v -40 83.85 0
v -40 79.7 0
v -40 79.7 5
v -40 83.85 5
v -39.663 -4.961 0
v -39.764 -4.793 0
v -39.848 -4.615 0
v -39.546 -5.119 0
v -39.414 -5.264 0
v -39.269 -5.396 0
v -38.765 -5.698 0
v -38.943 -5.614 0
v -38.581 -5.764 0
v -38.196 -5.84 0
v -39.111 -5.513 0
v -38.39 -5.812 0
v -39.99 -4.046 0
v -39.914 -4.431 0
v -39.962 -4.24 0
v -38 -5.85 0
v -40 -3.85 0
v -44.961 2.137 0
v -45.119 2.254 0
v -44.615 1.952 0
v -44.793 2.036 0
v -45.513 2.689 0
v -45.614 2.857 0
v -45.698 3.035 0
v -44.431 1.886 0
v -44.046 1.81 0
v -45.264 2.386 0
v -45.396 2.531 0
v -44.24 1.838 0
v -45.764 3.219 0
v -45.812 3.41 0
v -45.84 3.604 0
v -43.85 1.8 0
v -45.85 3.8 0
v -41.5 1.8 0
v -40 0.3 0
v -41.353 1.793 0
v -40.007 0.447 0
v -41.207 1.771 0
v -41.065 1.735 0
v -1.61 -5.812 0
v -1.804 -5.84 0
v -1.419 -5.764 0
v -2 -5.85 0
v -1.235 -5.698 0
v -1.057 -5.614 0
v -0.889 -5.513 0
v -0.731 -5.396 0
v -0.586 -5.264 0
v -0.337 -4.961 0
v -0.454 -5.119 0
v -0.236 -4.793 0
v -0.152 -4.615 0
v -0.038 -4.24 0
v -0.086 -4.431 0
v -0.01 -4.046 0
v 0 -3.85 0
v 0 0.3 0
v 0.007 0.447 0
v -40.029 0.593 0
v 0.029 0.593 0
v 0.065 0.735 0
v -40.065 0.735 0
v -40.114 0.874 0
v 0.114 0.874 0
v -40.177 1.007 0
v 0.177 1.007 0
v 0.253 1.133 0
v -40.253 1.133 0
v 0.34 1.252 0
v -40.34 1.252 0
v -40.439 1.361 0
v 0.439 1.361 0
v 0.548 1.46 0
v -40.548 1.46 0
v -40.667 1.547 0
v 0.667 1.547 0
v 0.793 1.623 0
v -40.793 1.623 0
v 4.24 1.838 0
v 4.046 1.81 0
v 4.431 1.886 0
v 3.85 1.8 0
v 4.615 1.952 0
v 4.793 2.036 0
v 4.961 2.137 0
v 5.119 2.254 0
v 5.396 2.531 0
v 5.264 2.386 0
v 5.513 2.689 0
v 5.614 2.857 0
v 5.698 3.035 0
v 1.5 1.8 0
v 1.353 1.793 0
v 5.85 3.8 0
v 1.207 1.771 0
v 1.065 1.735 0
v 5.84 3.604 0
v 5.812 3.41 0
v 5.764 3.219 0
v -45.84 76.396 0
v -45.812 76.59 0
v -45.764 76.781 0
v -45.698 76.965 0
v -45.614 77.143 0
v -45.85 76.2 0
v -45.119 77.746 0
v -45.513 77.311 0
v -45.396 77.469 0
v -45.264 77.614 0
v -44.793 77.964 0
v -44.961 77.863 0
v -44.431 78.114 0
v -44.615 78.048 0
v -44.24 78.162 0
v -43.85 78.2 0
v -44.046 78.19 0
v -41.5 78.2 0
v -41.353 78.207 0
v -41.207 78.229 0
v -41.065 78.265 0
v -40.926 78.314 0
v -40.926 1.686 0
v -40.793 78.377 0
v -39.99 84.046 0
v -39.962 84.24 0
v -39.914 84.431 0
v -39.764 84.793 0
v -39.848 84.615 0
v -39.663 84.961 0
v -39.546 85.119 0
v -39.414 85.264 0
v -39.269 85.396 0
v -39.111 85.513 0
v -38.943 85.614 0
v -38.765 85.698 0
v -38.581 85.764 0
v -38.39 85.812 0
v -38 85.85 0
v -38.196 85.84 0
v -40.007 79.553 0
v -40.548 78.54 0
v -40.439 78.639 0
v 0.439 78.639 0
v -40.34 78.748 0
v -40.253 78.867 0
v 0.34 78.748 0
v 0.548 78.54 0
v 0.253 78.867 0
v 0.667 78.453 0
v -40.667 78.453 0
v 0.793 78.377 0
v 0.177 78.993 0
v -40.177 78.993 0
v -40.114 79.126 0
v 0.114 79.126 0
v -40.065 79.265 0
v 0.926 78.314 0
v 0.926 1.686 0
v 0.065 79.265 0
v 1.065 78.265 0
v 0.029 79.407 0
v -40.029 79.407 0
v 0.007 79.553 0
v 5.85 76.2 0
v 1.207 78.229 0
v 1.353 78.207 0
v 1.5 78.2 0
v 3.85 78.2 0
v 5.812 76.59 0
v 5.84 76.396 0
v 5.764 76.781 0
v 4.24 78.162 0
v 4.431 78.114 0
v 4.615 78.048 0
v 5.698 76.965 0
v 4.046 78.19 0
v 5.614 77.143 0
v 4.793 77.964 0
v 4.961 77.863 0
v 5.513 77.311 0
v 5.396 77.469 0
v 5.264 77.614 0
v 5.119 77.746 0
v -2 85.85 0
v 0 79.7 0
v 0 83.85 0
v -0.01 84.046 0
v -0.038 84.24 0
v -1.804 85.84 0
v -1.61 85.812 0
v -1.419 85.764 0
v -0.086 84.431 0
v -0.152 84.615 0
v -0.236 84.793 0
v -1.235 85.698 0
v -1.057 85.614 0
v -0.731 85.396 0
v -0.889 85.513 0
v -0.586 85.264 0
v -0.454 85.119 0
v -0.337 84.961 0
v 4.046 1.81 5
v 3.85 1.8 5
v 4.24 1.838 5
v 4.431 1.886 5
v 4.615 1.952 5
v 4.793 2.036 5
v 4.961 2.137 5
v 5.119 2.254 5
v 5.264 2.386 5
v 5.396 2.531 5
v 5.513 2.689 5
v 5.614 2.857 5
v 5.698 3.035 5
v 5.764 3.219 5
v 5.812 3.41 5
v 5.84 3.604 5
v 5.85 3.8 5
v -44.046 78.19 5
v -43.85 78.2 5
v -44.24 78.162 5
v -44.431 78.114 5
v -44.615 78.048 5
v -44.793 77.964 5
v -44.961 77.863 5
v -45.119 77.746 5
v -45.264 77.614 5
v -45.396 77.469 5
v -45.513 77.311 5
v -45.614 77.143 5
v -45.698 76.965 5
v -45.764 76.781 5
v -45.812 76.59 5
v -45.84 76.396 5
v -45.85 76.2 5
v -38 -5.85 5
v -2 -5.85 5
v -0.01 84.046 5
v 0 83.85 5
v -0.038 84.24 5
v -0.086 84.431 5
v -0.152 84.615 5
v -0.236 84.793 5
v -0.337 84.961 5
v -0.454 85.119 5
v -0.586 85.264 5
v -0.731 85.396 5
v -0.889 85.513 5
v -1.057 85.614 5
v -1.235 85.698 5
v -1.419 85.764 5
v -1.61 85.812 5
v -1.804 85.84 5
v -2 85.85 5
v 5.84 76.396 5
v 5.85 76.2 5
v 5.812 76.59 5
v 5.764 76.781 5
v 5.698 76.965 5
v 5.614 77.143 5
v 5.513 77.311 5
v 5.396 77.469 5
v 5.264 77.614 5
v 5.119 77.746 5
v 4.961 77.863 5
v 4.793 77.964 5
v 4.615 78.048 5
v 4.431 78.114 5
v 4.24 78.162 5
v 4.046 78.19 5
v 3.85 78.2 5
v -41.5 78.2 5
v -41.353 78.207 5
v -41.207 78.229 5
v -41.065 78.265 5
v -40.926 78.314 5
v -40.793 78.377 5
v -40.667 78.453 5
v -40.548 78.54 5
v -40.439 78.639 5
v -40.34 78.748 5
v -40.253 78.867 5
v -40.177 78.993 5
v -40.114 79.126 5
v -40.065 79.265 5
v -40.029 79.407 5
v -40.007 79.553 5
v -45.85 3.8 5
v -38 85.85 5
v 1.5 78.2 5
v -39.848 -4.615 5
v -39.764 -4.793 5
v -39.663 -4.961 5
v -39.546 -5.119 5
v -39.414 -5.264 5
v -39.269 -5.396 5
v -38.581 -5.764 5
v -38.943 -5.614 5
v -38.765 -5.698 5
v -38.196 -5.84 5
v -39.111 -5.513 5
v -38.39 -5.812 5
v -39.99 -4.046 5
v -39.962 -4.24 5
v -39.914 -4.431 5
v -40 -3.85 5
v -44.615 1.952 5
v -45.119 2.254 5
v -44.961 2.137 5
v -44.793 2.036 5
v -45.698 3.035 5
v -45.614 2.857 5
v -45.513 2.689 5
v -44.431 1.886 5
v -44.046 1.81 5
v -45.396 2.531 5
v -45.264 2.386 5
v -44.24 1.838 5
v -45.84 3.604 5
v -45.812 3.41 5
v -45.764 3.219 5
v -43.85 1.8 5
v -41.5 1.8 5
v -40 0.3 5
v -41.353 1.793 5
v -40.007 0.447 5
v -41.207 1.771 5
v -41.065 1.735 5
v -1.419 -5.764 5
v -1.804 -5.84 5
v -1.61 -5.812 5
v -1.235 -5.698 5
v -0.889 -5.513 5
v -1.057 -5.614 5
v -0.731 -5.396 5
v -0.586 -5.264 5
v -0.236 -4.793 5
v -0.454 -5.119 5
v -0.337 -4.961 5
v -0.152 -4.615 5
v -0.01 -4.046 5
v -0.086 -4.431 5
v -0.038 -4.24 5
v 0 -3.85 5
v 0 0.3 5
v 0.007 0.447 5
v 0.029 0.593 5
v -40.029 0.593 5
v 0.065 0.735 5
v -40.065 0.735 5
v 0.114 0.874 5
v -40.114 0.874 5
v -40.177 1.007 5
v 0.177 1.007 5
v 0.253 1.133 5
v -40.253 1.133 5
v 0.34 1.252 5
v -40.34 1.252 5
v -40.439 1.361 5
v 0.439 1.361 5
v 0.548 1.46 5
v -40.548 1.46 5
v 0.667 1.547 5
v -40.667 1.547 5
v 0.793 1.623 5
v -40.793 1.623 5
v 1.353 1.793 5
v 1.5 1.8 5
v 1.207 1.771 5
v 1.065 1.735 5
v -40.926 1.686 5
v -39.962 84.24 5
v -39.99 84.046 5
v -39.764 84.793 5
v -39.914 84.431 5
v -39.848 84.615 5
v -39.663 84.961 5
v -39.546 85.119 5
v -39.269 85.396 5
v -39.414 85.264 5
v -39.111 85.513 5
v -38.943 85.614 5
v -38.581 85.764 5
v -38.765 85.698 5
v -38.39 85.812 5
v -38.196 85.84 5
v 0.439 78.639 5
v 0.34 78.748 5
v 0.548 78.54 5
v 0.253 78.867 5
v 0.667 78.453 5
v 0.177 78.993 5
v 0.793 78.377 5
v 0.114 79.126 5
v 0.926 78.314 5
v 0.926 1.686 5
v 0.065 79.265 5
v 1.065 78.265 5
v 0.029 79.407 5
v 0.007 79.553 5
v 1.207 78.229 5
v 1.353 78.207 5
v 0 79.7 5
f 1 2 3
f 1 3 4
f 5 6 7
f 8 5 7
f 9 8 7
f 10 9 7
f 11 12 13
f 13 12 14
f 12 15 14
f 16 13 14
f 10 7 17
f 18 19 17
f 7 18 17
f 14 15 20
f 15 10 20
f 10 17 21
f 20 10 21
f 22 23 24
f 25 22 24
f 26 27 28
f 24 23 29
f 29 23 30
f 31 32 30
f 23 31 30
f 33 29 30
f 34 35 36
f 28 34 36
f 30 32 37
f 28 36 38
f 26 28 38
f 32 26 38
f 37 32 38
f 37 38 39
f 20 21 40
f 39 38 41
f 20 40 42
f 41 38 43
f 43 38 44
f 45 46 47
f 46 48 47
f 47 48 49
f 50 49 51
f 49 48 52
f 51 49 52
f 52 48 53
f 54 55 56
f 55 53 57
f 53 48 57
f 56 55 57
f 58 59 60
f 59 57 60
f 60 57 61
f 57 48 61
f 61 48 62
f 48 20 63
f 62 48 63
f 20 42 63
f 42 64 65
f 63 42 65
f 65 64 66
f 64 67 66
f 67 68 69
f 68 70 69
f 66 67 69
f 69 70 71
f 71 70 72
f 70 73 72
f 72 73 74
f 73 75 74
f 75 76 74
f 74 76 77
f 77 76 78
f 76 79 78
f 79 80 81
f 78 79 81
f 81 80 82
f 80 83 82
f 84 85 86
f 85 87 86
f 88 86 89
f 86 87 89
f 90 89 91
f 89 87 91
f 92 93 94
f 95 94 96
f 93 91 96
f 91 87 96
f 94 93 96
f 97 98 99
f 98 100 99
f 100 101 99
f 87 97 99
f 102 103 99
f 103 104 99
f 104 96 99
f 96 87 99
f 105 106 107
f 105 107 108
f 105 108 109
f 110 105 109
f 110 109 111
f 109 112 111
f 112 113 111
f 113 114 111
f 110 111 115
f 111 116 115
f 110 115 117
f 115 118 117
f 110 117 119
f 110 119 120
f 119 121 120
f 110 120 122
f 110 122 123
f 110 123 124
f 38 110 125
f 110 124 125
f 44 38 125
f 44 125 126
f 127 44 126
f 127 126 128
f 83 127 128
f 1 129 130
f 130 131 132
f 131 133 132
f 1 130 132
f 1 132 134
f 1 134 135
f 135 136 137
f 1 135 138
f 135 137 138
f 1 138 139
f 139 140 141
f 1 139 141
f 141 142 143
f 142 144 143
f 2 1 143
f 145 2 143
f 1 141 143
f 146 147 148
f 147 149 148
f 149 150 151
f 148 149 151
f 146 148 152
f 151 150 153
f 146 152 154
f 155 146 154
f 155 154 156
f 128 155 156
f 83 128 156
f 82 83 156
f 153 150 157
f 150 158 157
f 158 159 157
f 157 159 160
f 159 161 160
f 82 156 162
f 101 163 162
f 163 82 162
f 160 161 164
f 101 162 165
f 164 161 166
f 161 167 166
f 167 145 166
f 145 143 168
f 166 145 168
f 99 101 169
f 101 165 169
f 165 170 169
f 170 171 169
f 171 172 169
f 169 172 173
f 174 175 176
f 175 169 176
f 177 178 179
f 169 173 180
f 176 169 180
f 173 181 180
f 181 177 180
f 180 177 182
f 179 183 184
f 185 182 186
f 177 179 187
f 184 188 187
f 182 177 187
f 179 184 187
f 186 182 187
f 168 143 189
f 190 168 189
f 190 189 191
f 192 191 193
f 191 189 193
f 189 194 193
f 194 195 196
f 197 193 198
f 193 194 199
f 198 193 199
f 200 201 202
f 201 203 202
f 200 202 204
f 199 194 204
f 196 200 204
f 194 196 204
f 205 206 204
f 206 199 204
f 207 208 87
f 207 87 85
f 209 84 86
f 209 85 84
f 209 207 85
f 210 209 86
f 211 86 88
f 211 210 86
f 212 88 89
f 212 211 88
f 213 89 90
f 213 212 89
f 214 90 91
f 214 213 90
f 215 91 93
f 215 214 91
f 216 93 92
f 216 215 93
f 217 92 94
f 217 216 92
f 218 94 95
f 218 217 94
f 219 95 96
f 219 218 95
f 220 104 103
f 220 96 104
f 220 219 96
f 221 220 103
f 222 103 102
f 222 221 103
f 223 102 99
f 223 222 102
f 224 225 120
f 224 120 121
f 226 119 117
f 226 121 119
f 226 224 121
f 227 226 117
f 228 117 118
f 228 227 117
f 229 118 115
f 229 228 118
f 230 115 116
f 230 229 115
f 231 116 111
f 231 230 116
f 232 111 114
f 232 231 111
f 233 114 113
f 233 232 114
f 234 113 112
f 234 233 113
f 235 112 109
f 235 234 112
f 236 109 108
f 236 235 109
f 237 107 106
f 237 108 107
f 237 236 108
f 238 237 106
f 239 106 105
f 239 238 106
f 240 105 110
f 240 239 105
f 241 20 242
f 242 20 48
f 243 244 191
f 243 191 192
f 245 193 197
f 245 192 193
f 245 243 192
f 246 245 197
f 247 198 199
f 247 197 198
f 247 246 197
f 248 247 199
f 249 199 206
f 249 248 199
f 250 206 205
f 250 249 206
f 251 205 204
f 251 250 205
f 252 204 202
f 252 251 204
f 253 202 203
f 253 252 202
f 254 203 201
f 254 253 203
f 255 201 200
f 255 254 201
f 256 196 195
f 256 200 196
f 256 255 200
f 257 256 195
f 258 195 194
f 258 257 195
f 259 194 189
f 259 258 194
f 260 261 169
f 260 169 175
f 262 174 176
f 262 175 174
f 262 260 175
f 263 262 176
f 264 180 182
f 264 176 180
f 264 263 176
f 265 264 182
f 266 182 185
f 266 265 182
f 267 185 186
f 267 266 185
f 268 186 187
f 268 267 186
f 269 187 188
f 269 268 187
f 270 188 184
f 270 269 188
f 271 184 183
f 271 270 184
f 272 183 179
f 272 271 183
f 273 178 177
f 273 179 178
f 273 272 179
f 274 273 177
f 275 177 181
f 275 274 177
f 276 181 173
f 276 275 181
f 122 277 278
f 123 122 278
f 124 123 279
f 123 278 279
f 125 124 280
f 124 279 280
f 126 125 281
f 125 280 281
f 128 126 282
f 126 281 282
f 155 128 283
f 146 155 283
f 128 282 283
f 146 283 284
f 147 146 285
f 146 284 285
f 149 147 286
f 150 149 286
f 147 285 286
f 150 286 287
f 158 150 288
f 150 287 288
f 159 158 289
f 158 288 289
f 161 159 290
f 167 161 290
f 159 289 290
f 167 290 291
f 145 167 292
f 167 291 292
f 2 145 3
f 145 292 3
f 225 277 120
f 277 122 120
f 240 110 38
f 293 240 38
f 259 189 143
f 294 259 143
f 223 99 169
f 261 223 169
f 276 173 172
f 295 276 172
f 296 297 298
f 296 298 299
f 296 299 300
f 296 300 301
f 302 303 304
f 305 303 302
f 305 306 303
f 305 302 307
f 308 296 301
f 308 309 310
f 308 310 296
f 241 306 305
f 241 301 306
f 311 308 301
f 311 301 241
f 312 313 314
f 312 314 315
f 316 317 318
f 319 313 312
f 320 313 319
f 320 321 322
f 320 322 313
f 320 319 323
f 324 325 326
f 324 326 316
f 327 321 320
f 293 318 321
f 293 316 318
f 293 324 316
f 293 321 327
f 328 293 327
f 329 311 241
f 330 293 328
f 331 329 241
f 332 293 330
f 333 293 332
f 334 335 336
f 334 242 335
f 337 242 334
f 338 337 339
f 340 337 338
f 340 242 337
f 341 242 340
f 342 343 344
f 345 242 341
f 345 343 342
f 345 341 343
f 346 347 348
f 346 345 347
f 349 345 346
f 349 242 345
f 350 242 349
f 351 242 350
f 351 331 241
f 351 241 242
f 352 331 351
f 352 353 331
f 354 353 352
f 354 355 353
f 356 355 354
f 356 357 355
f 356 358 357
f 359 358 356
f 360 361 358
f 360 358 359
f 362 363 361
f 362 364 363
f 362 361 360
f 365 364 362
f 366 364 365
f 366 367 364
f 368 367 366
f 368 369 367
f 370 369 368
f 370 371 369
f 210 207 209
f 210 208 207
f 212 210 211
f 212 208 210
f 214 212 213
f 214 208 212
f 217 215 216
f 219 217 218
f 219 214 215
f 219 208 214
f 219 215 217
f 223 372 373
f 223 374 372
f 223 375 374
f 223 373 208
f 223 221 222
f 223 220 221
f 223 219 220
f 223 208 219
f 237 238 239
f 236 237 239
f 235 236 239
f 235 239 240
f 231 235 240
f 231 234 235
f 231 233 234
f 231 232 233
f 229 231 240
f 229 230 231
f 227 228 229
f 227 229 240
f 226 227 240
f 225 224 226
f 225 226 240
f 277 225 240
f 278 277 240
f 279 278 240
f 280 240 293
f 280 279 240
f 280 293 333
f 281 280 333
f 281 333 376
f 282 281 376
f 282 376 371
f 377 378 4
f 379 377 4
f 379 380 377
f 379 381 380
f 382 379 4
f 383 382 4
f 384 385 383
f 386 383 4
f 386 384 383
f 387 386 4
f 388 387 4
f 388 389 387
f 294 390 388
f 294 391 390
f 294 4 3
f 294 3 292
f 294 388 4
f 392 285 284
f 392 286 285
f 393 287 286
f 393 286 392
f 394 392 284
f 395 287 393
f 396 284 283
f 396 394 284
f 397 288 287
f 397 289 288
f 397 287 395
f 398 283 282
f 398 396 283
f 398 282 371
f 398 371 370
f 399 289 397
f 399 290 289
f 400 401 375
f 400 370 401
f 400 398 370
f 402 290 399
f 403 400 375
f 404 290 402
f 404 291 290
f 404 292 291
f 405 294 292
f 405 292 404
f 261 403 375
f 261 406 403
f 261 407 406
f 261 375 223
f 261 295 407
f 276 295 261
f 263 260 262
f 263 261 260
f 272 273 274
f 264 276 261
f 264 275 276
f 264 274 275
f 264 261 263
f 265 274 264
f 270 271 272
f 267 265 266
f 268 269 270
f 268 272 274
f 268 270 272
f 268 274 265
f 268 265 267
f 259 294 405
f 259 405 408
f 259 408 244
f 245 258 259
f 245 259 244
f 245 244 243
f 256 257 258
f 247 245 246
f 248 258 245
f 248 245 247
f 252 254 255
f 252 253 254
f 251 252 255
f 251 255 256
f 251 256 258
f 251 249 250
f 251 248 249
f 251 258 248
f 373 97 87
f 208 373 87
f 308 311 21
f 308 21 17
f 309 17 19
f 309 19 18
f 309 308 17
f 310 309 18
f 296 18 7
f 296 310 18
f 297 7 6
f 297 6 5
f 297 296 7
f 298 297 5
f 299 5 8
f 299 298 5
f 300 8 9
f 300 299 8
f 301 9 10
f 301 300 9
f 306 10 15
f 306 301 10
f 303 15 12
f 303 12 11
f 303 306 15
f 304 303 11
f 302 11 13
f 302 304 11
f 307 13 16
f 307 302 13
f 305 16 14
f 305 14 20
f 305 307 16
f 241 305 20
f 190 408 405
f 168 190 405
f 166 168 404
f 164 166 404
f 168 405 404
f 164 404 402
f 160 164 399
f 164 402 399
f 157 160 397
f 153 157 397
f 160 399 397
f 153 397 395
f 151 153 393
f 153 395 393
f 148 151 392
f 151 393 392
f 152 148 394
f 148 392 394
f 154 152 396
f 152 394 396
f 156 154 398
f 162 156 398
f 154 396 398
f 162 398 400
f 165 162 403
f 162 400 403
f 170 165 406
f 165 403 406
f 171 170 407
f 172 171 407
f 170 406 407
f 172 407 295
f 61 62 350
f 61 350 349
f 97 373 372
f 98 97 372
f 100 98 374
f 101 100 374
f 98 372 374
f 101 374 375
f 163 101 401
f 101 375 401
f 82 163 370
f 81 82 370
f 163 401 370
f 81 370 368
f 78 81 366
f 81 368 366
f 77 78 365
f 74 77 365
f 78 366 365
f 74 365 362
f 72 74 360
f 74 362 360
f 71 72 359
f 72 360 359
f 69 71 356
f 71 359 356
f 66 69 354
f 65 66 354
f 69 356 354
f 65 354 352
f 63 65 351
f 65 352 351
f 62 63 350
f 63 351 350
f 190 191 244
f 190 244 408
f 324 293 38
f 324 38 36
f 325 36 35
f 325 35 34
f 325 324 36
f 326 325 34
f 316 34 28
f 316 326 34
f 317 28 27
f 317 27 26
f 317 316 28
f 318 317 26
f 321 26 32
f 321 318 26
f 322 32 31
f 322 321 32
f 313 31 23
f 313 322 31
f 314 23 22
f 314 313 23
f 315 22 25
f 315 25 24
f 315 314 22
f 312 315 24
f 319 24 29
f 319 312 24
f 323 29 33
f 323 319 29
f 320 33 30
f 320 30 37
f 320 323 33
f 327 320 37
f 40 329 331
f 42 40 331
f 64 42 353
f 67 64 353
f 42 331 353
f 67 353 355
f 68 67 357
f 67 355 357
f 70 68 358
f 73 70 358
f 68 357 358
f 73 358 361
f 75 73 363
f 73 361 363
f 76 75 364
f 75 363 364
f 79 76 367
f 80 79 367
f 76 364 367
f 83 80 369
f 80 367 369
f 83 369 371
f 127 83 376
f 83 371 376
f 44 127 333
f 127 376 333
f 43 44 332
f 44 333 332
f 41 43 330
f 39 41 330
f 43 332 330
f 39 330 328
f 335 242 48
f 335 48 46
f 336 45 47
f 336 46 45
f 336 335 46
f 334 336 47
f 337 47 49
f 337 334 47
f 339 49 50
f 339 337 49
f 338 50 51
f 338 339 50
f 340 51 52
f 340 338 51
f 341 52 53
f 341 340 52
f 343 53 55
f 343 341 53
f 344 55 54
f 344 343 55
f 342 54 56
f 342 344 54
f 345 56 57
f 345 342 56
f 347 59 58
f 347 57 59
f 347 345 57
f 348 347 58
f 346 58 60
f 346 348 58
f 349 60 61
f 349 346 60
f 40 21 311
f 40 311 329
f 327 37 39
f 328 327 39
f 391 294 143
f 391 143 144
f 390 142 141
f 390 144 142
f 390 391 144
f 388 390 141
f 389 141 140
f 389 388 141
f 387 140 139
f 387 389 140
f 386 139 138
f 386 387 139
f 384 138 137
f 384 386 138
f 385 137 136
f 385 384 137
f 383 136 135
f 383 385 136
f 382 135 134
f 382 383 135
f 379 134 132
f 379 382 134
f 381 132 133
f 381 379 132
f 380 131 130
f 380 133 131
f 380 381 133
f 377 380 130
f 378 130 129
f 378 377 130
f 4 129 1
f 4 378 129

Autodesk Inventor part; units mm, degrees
ref_plane "YZ Plane" through (0, 0, 0) normal (1, 0, 0) x (0, 1, 0)
ref_plane "XZ Plane" through (0, 0, 0) normal (0, 1, 0) x (-1, 0, 0)
ref_plane "XY Plane" through (0, 0, 0) normal (0, 0, 1) x (1, 0, 0)
sketch "Skizze3" plane through (0, 0, 0) normal (0, 0, 1) x (1, 0, 0)
  line L0 (0, 0) -> (-40, 0)
  line L1 (-40, 0) -> (-40, 80)
  line L2 (-40, 80) -> (0, 80)
  line L3 (0, 80) -> (0, 0)
  line L4 (-40, 78.2) -> (-45.85, 78.2)
  line L5 (-45.85, 78.2) -> (-45.85, 40)
  line L6 (-45.85, 40) -> (-40, 40)
  line L7 (-40, 40) -> (-40, 78.2)
  line L8 (-40, 80) -> (-20, 80)
  line L9 (-20, 80) -> (-20, 85.85)
  line L10 (-20, 85.85) -> (-40, 85.85)
  line L11 (-40, 85.85) -> (-40, 80)
  point P0 (-40, 40)
  point P1 (-20, 80)
  dimension "d4" = 80
  dimension "d5" = 40
  dimension "d6" = 5.85
  dimension "d7" = 1.8
  dimension "d8" = 5.85
extrude "Extrusion3" add sketch "Skizze3" along normal blind 5 contours L0 L1 L2 L3
extrude "Extrusion4" add sketch "Skizze3" along normal blind 5 contours L6 L5 L4 L1 | L2 L11 L10 L9
fillet "Rundung1" radius 2 2 edges at (-45.85, 78.2, 2.5) (-40, 85.85, 2.5)
mirror "Spiegeln1" about plane through (-45.85, 40, 0) normal (0, -1, 0) of "Extrusion4", "Rundung1"
mirror "Spiegeln2" about plane through (-20, 80, 0) normal (1, 0, 0) of "Extrusion4", "Rundung1", "Spiegeln1"
fillet "Rundung2" radius 1.5 4 edges at (0, 78.2, 2.5) (-40, 78.2, 2.5) (-40, 1.8, 2.5) (0, 1.8, 2.5)
equation "\"d6\" = d8"
properties part number "BT702_trajan20_21" material "Acryl"
